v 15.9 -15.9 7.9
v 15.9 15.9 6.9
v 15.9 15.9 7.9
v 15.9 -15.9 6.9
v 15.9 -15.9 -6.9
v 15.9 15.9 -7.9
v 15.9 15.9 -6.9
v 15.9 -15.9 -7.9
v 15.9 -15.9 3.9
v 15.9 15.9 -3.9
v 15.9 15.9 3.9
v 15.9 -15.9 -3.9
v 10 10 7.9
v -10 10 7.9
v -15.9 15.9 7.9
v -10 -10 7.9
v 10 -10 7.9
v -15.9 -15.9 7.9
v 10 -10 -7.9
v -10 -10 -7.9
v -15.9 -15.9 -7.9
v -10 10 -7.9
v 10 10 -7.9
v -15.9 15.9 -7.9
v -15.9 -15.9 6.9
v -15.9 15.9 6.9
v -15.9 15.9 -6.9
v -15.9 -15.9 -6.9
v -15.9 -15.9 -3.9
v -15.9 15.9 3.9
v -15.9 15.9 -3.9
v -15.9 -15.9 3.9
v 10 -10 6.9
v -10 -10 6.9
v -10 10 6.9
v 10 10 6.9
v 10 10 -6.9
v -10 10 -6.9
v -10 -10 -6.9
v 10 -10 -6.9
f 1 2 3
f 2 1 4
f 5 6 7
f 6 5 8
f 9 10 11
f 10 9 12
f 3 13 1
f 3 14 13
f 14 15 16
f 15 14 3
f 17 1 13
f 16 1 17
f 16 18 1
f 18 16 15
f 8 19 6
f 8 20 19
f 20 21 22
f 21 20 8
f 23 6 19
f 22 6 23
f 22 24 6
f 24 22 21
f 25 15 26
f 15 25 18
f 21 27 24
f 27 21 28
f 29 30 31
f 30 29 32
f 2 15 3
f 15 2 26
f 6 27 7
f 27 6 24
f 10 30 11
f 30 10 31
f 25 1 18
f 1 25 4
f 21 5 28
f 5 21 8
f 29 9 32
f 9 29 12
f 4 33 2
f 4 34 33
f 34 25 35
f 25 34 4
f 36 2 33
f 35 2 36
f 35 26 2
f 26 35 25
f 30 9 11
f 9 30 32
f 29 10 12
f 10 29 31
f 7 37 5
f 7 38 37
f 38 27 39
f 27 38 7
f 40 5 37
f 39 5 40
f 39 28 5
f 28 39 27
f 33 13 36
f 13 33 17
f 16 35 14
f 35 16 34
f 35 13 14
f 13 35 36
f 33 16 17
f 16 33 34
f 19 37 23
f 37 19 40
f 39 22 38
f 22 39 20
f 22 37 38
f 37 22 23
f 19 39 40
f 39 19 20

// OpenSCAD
module stepped_bracket() {
    difference() {
        union() {
            // Main H-like structure
            translate([-15.9, -15.9, -7.9])
                cube([31.8, 31.8, 15.8]);
            
            // Central bridge
            translate([-5, -15.9, -7.9])
                cube([10, 31.8, 15.8]);
        }
        
        // Top and bottom shoulder steps
        translate([-15.9, -15.9, 3.9])
            cube([31.8, 31.8, 3]);
        translate([-15.9, -15.9, -6.9])
            cube([31.8, 31.8, 3]);
        
        // Offset pads for asymmetric profile
        translate([-10, -10, 6.9])
            cube([20, 20, 3]);
        translate([-10, -10, -9.9])
            cube([20, 20, 3]);
    }
}

stepped_bracket();
